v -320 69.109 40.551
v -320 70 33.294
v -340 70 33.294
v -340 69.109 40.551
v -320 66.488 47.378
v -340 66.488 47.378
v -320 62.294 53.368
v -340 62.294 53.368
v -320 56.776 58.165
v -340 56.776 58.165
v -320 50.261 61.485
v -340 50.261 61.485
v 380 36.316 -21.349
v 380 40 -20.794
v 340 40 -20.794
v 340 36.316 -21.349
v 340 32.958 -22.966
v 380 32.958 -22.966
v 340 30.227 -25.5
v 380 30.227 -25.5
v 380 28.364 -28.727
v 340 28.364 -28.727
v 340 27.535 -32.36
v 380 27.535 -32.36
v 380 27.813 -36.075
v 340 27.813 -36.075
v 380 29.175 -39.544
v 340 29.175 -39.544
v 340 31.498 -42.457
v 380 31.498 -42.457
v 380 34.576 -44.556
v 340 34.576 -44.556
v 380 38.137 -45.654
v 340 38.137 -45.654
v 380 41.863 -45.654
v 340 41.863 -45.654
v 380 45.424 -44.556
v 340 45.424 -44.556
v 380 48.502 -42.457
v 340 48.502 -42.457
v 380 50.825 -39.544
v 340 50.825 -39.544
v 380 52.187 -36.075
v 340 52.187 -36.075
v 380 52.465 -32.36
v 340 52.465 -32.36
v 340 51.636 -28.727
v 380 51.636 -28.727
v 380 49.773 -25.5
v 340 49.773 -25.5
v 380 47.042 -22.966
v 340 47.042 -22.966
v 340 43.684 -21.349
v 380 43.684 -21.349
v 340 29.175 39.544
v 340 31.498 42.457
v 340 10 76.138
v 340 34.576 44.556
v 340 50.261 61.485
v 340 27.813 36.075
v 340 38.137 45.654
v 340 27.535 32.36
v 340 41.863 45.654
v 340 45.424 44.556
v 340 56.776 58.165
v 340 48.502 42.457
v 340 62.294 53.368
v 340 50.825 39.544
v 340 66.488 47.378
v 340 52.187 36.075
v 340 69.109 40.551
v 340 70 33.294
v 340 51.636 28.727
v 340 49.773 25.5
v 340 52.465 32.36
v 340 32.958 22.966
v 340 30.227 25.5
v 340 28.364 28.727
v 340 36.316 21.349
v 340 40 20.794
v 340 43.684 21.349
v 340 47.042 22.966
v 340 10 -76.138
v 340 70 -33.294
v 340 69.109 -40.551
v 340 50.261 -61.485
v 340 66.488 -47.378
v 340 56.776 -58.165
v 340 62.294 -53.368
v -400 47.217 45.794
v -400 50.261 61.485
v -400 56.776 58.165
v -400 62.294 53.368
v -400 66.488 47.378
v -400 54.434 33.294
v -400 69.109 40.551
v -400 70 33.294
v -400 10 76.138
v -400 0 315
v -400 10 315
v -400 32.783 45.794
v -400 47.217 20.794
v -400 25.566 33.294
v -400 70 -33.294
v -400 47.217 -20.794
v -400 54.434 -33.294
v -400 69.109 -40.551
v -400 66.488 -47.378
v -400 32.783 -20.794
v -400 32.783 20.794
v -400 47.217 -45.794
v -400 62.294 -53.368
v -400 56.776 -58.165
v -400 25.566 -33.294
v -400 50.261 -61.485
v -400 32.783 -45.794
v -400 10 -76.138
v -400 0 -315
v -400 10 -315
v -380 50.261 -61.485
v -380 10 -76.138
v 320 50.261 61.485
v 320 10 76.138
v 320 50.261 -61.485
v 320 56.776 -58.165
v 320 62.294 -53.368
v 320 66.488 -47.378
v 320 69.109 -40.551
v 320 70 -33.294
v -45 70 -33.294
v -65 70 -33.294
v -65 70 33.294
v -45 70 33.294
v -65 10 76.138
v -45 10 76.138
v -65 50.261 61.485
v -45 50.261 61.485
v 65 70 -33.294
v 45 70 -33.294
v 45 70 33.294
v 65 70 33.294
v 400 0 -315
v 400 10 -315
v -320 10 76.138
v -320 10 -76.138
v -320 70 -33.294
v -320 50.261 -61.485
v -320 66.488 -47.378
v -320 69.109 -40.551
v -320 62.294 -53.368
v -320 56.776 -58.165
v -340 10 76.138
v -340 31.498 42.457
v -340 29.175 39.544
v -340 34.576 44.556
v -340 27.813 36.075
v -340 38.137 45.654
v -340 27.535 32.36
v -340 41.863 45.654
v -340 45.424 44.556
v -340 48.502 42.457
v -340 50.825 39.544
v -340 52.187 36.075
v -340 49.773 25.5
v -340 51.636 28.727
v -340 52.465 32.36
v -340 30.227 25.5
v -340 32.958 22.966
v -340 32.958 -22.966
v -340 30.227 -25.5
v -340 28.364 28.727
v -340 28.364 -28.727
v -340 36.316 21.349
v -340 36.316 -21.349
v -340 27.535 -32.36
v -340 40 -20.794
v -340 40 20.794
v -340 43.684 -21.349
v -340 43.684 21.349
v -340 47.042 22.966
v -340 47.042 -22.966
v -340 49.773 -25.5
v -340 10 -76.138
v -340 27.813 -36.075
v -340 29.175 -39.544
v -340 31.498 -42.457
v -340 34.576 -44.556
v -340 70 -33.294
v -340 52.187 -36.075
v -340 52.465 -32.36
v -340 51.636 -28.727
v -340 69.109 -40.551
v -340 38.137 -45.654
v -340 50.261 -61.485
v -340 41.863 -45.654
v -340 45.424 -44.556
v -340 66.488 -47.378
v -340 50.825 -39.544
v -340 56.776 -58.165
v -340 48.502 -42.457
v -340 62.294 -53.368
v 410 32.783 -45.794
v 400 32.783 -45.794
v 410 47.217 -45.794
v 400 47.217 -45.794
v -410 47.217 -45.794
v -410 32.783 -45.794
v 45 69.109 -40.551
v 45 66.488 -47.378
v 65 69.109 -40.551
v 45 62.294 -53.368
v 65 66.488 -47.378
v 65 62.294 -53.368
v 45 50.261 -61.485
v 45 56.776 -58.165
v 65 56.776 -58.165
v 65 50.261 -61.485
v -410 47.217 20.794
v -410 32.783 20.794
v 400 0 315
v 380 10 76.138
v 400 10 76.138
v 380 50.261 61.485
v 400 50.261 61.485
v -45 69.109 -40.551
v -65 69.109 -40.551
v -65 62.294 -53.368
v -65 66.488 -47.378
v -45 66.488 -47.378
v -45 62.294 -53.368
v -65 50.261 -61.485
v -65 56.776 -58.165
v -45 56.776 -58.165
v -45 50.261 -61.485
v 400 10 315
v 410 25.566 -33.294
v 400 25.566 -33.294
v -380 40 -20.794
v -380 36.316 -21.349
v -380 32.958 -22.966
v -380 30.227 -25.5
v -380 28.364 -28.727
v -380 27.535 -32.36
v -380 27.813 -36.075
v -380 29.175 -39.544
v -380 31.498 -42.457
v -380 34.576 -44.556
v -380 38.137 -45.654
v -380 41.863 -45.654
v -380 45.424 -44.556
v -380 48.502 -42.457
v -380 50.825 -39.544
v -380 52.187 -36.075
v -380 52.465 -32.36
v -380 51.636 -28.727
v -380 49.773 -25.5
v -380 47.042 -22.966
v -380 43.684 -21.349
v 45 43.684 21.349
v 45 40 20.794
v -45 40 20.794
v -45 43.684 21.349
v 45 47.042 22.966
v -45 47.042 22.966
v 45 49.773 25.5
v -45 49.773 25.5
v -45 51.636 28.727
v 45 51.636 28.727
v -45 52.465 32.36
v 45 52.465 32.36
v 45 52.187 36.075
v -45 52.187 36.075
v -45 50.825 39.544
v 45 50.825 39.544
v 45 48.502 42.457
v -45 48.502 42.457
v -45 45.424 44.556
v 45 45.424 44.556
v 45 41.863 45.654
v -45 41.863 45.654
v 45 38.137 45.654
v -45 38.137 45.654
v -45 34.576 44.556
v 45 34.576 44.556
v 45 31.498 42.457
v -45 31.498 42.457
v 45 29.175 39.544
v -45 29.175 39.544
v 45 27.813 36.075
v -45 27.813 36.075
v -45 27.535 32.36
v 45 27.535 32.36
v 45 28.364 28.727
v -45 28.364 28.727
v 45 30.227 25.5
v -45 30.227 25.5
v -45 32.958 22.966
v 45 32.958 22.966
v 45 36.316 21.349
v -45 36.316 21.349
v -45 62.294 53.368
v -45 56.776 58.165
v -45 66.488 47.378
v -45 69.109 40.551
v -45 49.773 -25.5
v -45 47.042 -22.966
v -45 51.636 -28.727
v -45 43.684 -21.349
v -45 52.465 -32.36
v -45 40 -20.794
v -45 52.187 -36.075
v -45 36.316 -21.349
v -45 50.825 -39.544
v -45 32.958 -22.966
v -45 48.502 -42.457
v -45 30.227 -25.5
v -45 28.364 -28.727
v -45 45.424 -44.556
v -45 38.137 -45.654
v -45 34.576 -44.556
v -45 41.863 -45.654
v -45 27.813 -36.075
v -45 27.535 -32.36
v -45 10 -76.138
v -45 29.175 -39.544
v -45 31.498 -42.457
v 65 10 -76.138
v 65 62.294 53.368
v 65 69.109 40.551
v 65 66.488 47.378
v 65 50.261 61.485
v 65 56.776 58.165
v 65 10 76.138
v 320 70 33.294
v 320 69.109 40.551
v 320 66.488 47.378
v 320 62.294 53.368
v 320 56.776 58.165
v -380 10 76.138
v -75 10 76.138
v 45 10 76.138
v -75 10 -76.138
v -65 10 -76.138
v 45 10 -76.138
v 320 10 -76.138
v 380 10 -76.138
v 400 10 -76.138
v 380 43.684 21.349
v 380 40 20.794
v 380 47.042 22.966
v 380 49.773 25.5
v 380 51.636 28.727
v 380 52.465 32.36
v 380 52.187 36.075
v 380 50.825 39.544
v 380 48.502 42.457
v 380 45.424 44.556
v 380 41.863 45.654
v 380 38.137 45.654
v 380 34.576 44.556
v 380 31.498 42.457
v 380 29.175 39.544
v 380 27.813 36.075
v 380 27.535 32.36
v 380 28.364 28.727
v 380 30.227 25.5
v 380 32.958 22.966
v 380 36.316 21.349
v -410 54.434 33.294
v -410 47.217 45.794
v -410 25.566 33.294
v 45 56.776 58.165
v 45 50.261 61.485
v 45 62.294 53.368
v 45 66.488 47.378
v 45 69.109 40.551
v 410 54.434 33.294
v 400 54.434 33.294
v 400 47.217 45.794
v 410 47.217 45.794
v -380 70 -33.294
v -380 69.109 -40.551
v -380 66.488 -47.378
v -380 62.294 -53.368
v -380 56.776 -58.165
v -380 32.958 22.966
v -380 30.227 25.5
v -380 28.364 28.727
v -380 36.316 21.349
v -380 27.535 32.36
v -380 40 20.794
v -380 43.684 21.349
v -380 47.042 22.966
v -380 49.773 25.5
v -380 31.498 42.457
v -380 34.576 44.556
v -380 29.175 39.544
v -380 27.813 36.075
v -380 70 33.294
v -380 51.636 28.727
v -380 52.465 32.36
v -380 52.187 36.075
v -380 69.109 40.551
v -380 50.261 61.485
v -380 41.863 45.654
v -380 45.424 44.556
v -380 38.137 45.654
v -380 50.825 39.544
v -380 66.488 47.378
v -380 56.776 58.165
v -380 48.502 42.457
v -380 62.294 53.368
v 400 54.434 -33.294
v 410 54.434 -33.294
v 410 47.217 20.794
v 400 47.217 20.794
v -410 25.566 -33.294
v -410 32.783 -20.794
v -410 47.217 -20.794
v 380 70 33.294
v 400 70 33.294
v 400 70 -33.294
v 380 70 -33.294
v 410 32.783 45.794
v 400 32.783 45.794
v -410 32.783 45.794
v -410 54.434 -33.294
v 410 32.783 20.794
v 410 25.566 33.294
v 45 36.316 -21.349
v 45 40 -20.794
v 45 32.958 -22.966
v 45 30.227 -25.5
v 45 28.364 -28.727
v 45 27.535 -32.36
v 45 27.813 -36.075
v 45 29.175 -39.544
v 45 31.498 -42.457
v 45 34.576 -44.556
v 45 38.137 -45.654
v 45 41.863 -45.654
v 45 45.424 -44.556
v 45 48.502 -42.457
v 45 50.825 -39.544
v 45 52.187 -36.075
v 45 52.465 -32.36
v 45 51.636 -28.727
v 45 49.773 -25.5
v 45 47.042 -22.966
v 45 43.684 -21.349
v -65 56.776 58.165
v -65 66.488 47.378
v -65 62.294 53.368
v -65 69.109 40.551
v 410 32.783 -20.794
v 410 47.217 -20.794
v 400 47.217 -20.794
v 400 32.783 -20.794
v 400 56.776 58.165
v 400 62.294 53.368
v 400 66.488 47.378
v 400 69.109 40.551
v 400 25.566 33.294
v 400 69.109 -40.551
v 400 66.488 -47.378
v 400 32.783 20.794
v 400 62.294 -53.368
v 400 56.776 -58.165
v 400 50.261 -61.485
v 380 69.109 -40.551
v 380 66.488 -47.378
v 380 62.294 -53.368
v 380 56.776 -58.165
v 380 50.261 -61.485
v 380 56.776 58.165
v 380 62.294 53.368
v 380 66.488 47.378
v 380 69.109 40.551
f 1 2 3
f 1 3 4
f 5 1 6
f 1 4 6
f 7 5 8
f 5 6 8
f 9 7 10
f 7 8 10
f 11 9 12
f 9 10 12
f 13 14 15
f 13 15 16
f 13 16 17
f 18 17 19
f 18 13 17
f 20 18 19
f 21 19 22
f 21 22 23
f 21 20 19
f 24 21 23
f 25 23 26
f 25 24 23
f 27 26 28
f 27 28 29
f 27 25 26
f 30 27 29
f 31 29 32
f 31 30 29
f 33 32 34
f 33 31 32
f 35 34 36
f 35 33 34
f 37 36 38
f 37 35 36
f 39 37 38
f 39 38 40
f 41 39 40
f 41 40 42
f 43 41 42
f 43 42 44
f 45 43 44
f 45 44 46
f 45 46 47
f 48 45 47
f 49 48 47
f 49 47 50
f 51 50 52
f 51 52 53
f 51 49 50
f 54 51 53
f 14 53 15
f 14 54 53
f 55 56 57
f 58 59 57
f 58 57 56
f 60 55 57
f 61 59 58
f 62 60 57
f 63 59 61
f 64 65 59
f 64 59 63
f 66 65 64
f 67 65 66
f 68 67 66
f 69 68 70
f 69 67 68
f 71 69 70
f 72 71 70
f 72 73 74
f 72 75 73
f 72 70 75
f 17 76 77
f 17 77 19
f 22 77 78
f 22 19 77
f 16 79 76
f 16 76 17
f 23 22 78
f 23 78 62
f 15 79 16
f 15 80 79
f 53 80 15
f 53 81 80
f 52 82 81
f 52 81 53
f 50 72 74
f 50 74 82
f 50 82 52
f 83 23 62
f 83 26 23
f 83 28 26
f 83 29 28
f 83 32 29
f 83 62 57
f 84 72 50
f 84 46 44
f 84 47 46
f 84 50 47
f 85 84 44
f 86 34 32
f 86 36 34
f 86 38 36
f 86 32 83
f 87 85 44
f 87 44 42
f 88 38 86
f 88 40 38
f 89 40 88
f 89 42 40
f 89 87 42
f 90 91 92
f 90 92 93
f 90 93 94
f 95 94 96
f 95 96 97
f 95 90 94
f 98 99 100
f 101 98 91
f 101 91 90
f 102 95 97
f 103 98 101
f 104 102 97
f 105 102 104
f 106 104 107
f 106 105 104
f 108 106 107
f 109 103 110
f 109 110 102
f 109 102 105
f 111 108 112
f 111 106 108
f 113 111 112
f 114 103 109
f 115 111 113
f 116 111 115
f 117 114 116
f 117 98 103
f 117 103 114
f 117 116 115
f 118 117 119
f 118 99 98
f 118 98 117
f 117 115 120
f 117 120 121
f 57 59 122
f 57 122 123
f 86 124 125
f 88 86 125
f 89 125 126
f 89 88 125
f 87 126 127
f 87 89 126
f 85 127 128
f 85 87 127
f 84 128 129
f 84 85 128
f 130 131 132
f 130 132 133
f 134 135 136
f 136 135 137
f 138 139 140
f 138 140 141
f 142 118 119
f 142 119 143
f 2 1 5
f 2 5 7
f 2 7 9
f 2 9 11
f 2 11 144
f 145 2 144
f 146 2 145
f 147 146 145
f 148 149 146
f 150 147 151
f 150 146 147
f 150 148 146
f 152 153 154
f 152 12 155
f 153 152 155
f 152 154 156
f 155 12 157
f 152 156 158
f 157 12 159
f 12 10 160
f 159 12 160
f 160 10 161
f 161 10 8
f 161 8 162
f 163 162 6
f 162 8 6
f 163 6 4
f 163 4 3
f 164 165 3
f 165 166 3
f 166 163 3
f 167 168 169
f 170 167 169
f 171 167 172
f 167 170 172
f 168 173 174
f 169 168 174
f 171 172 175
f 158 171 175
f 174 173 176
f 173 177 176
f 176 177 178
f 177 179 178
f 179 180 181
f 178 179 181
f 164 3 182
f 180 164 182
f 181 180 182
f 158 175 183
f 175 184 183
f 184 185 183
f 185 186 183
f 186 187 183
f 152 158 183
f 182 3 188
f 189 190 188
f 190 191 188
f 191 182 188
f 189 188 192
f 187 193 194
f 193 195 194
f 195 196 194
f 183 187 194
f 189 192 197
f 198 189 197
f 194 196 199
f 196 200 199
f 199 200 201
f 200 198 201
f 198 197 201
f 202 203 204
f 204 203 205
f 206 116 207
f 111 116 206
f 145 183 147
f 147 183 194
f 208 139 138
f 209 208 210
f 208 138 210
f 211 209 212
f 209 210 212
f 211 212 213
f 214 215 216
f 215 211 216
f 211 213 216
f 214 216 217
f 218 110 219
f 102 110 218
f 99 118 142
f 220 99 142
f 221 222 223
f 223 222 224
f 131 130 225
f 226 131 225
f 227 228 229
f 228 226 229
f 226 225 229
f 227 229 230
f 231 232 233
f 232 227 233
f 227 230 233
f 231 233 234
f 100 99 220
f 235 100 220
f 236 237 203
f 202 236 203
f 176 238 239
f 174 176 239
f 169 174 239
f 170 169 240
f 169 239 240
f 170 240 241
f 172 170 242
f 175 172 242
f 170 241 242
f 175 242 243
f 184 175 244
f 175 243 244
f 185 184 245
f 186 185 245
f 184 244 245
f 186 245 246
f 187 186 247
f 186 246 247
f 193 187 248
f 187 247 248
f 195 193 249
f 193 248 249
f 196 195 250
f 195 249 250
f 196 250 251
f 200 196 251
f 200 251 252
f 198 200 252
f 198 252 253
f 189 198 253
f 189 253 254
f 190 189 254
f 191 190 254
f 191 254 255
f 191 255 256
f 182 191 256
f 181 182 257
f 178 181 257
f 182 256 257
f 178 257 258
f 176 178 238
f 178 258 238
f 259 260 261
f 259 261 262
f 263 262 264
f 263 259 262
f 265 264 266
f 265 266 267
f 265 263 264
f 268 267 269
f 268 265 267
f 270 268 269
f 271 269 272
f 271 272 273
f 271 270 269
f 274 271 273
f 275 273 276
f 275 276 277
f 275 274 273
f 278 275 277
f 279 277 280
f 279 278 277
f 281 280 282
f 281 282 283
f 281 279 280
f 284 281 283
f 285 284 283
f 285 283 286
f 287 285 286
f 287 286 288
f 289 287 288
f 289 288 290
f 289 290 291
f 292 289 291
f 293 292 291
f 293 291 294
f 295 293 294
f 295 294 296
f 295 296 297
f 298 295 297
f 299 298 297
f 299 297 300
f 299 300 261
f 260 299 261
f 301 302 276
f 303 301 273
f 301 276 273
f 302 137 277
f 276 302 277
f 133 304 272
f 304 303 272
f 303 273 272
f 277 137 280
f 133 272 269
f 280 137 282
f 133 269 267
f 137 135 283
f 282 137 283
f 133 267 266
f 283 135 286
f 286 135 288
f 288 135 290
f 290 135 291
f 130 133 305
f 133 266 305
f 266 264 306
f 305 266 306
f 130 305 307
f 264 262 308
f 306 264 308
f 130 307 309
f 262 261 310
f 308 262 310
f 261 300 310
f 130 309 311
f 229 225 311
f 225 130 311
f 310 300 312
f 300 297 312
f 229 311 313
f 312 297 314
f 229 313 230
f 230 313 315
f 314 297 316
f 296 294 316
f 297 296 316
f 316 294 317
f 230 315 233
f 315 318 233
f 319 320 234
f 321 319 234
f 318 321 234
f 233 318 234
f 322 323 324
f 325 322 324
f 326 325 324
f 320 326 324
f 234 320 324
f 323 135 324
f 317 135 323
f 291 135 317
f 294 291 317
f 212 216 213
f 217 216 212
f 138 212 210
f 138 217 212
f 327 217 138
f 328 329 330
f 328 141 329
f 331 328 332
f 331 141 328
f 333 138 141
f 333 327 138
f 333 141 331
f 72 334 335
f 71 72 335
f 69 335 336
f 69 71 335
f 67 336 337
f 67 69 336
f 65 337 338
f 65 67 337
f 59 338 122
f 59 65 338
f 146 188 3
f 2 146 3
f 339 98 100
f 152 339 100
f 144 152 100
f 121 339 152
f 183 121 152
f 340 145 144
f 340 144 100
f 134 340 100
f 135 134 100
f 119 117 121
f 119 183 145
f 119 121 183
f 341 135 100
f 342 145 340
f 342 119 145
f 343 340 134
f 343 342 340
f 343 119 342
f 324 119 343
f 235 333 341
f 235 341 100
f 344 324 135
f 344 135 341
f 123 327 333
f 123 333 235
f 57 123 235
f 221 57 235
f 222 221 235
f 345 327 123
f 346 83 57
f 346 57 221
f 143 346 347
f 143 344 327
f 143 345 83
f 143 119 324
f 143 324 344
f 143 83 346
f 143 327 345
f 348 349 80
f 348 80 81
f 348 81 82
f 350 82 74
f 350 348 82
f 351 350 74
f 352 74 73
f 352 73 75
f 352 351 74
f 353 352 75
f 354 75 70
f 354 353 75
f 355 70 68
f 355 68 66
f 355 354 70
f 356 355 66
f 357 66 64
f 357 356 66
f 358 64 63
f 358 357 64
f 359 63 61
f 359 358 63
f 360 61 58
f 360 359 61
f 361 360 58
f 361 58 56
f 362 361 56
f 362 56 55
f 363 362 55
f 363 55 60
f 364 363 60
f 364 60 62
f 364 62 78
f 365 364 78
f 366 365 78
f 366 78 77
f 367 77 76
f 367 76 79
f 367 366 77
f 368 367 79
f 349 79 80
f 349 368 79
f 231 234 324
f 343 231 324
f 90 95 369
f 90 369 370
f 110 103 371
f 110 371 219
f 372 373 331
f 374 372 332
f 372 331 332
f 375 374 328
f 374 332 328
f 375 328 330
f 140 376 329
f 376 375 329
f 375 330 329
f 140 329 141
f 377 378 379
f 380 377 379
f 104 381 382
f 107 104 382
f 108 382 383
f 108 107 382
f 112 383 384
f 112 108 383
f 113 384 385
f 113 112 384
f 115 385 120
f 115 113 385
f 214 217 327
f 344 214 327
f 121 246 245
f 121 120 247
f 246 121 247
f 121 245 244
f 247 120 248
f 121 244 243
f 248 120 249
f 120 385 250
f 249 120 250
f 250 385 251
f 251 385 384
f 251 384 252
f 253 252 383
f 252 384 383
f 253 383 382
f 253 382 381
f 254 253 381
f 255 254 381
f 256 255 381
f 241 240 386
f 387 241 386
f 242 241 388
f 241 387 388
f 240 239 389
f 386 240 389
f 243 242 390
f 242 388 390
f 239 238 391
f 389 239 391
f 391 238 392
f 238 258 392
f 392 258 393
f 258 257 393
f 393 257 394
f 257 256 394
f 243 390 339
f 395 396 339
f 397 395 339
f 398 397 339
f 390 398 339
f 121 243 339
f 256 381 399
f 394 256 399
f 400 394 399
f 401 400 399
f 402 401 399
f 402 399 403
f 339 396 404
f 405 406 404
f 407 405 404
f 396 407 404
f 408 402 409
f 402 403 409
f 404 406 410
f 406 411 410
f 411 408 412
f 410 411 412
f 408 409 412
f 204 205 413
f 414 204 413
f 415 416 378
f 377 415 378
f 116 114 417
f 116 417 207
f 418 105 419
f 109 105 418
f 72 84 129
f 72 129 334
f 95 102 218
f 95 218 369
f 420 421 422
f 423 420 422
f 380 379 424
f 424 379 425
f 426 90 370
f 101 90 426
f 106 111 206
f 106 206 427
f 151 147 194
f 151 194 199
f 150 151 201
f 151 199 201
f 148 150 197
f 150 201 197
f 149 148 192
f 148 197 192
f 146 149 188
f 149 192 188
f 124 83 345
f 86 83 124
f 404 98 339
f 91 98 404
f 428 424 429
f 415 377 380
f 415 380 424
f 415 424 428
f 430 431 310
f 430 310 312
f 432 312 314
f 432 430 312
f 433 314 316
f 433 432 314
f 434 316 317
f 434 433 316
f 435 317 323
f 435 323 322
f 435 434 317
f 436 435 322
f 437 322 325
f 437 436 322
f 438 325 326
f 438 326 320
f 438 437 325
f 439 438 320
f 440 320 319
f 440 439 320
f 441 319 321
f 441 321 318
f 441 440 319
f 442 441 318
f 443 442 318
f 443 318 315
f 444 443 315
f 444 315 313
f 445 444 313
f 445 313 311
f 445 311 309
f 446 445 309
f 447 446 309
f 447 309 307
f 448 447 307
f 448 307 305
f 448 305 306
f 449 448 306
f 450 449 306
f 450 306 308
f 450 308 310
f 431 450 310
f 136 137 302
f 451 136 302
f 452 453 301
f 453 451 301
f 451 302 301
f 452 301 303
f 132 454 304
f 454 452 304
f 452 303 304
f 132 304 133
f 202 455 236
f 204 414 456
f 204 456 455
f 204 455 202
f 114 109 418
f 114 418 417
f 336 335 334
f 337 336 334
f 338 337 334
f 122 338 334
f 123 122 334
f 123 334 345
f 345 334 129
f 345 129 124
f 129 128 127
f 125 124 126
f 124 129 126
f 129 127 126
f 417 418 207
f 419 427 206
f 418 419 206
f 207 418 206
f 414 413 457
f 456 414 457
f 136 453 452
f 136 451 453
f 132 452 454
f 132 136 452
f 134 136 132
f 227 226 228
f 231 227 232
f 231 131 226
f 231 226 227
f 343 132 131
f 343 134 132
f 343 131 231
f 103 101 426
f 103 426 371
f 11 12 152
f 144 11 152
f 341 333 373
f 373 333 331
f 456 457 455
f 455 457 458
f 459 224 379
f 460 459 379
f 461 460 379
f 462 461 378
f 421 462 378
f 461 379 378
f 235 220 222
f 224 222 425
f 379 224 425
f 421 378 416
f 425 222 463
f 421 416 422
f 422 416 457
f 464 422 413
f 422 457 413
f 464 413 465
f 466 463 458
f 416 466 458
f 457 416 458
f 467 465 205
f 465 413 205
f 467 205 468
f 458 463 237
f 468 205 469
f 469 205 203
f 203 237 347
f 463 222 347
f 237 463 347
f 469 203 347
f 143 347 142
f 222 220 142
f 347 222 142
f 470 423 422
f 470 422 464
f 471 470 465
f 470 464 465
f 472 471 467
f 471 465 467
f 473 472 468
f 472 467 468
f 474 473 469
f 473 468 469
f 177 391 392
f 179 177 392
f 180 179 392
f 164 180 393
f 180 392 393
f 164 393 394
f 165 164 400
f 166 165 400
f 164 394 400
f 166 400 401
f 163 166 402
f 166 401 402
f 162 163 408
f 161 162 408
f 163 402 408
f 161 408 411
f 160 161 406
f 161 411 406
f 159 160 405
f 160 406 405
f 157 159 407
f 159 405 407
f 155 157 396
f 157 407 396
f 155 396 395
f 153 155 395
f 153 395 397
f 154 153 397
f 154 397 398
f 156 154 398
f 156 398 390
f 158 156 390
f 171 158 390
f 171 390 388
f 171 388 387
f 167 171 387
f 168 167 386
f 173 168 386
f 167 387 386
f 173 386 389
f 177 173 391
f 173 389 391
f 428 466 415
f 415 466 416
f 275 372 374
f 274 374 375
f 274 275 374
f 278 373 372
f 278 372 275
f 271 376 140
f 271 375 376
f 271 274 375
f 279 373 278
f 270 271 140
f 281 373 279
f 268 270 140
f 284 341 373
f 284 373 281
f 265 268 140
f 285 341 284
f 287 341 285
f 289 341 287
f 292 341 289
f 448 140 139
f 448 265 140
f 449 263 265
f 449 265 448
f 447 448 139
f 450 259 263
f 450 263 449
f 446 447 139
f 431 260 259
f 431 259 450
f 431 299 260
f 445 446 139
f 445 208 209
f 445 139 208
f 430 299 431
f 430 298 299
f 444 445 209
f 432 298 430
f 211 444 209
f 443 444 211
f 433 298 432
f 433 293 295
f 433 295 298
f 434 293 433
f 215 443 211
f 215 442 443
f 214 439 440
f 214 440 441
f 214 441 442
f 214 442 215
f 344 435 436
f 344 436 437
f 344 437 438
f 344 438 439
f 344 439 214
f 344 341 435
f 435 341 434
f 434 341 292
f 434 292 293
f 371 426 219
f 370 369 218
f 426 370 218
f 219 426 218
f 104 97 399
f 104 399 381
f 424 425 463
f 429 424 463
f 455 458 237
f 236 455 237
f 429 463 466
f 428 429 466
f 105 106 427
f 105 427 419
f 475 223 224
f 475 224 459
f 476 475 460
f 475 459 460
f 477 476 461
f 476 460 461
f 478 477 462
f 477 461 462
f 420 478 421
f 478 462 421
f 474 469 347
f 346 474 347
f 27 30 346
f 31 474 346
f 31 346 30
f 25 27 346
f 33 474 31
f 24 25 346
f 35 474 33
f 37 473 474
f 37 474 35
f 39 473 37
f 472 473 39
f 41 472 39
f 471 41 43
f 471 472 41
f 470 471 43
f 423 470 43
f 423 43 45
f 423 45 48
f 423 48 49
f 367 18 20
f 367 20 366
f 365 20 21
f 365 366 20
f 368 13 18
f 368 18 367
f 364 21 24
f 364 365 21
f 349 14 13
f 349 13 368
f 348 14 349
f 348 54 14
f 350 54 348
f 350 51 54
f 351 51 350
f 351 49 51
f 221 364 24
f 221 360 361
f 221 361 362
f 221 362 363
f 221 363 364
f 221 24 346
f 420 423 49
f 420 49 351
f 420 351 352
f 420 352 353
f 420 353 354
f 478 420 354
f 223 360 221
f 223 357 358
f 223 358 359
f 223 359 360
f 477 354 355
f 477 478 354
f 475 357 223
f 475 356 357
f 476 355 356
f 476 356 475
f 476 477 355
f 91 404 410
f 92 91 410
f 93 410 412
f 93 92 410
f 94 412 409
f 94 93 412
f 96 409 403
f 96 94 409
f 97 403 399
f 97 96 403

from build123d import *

# Parameters (mm, degrees)
CROQUIS1_W              = 800
CROQUIS1_H              = 630
SALIENTE_EXTRUIR1_DEPTH = 10
SALIENTE_EXTRUIR3_DEPTH = 20
SALIENTE_EXTRUIR4_DEPTH = 10
CROQUIS5_R              = 12.5
SALIENTE_EXTRUIR5_DEPTH = 40
SALIENTE_EXTRUIR6_DEPTH = 20
CROQUIS7_W              = 20
CROQUIS7_H              = 152.276428112
SALIENTE_EXTRUIR7_DEPTH = 60
CORTAR_EXTRUIR1_DEPTH   = 140
CROQUIS9_R              = 12.5
SALIENTE_EXTRUIR8_DEPTH = 111


with BuildPart() as part:
    # Croquis1 → Saliente-Extruir1 (new body)
    with BuildSketch(Plane(origin=(0, 0, 0), x_dir=(1, 0, 0), z_dir=(0, 1, 0))):
        Rectangle(CROQUIS1_W, CROQUIS1_H)
    extrude(amount=SALIENTE_EXTRUIR1_DEPTH)

    # Croquis2 → Saliente-Extruir3 (add)
    with BuildSketch(Plane(origin=(400, 0, 0), x_dir=(0, 0, -1), z_dir=(1, 0, 0))):
        with BuildLine():
            Line((-33.293773854, 70), (33.293773854, 70))
            ThreePointArc((33.293773854, 70), (50.501066944, 64.574561329), (61.484552477, 50.2606043))
            Line((61.484552477, 50.2606043), (76.138214056, 10))
            Line((76.138214056, 10), (-76.138214056, 10))
            Line((-76.138214056, 10), (-61.484552477, 50.2606043))
            ThreePointArc((-61.484552477, 50.2606043), (-50.501066944, 64.574561329), (-33.293773854, 70))
        make_face()
    saliente_extruir3 = extrude(amount=-SALIENTE_EXTRUIR3_DEPTH)

    # Croquis4 → Saliente-Extruir4 (add)
    with BuildSketch(Plane(origin=(400, 0, 0), x_dir=(0, 0, -1), z_dir=(1, 0, 0))):
        Polygon((-33.293773854, 54.43375673), (-45.793773854, 47.216878365), (-45.793773854, 32.783121635), (-33.293773854, 25.56624327), (-20.793773854, 32.783121635), (-20.793773854, 47.216878365), align=None)
        Polygon((33.293773854, 54.43375673), (20.793773854, 47.216878365), (20.793773854, 32.783121635), (33.293773854, 25.56624327), (45.793773854, 32.783121635), (45.793773854, 47.216878365), align=None)
    saliente_extruir4 = extrude(amount=SALIENTE_EXTRUIR4_DEPTH)

    # Simetría1: Saliente-Extruir3, Saliente-Extruir4 across plane
    add(saliente_extruir3.mirror(Plane(origin=(0, 0, 0), x_dir=(0, 0, 1), z_dir=(1, 0, 0))))
    add(saliente_extruir4.mirror(Plane(origin=(0, 0, 0), x_dir=(0, 0, 1), z_dir=(1, 0, 0))))

    # Croquis5 → Saliente-Extruir5 (add)
    with BuildSketch(Plane(origin=(-380, 0, 0), x_dir=(0, 0, -1), z_dir=(1, 0, 0))):
        with Locations((-33.293773854, 40)):
            Circle(CROQUIS5_R)
        with Locations((33.293773854, 40)):
            Circle(CROQUIS5_R)
    saliente_extruir5 = extrude(amount=SALIENTE_EXTRUIR5_DEPTH)

    # Croquis6 → Saliente-Extruir6 (add)
    with BuildSketch(Plane(origin=(-340, 0, 0), x_dir=(0, 0, -1), z_dir=(1, 0, 0))):
        with BuildLine():
            Line((-76.138214056, 10), (76.138214056, 10))
            Line((76.138214056, 10), (61.484552477, 50.2606043))
            ThreePointArc((61.484552477, 50.2606043), (50.501066944, 64.574561329), (33.293773854, 70))
            Line((33.293773854, 70), (-33.293773854, 70))
            ThreePointArc((-33.293773854, 70), (-50.501066944, 64.574561329), (-61.484552477, 50.2606043))
            Line((-61.484552477, 50.2606043), (-76.138214056, 10))
        make_face()
    saliente_extruir6 = extrude(amount=SALIENTE_EXTRUIR6_DEPTH)

    # Simetría2: Saliente-Extruir5, Saliente-Extruir6 across plane
    add(saliente_extruir5.mirror(Plane(origin=(0, 0, 0), x_dir=(0, 0, 1), z_dir=(1, 0, 0))))
    add(saliente_extruir6.mirror(Plane(origin=(0, 0, 0), x_dir=(0, 0, 1), z_dir=(1, 0, 0))))

    # Croquis7 → Saliente-Extruir7 (add)
    with BuildSketch(Plane(origin=(0, 10, 0), x_dir=(1, 0, 0), z_dir=(0, 1, 0))):
        with Locations((-55, 0)):
            Rectangle(CROQUIS7_W, CROQUIS7_H)
        with Locations((55, 0)):
            Rectangle(CROQUIS7_W, CROQUIS7_H)
    extrude(amount=SALIENTE_EXTRUIR7_DEPTH)

    # Croquis8 → Cortar-Extruir1 (cut)
    with BuildSketch(Plane(origin=(65, 0, 0), x_dir=(0, 0, -1), z_dir=(1, 0, 0))):
        with BuildLine():
            ThreePointArc((-61.484552477, 50.2606043), (-50.501066944, 64.574561329), (-33.293773854, 70))
            Line((-33.293773854, 70), (-76.138214056, 70))
            Line((-76.138214056, 70), (-76.138214056, 10))
            Line((-76.138214056, 10), (-61.484552477, 50.2606043))
        make_face()
        with BuildLine():
            Line((61.484552477, 50.2606043), (76.138214056, 10))
            Line((76.138214056, 10), (76.138214056, 70))
            Line((76.138214056, 70), (33.293773854, 70))
            ThreePointArc((33.293773854, 70), (50.501066944, 64.574561329), (61.484552477, 50.2606043))
        make_face()
    extrude(amount=-CORTAR_EXTRUIR1_DEPTH, mode=Mode.SUBTRACT)

    # Croquis9 → Saliente-Extruir8 (add)
    with BuildSketch(Plane(origin=(65, 0, 0), x_dir=(0, 0, -1), z_dir=(1, 0, 0))):
        with Locations((33.293773854, 40)):
            Circle(CROQUIS9_R)
        with Locations((-33.293773854, 40)):
            Circle(CROQUIS9_R)
    extrude(amount=-SALIENTE_EXTRUIR8_DEPTH)


solid = part.part
